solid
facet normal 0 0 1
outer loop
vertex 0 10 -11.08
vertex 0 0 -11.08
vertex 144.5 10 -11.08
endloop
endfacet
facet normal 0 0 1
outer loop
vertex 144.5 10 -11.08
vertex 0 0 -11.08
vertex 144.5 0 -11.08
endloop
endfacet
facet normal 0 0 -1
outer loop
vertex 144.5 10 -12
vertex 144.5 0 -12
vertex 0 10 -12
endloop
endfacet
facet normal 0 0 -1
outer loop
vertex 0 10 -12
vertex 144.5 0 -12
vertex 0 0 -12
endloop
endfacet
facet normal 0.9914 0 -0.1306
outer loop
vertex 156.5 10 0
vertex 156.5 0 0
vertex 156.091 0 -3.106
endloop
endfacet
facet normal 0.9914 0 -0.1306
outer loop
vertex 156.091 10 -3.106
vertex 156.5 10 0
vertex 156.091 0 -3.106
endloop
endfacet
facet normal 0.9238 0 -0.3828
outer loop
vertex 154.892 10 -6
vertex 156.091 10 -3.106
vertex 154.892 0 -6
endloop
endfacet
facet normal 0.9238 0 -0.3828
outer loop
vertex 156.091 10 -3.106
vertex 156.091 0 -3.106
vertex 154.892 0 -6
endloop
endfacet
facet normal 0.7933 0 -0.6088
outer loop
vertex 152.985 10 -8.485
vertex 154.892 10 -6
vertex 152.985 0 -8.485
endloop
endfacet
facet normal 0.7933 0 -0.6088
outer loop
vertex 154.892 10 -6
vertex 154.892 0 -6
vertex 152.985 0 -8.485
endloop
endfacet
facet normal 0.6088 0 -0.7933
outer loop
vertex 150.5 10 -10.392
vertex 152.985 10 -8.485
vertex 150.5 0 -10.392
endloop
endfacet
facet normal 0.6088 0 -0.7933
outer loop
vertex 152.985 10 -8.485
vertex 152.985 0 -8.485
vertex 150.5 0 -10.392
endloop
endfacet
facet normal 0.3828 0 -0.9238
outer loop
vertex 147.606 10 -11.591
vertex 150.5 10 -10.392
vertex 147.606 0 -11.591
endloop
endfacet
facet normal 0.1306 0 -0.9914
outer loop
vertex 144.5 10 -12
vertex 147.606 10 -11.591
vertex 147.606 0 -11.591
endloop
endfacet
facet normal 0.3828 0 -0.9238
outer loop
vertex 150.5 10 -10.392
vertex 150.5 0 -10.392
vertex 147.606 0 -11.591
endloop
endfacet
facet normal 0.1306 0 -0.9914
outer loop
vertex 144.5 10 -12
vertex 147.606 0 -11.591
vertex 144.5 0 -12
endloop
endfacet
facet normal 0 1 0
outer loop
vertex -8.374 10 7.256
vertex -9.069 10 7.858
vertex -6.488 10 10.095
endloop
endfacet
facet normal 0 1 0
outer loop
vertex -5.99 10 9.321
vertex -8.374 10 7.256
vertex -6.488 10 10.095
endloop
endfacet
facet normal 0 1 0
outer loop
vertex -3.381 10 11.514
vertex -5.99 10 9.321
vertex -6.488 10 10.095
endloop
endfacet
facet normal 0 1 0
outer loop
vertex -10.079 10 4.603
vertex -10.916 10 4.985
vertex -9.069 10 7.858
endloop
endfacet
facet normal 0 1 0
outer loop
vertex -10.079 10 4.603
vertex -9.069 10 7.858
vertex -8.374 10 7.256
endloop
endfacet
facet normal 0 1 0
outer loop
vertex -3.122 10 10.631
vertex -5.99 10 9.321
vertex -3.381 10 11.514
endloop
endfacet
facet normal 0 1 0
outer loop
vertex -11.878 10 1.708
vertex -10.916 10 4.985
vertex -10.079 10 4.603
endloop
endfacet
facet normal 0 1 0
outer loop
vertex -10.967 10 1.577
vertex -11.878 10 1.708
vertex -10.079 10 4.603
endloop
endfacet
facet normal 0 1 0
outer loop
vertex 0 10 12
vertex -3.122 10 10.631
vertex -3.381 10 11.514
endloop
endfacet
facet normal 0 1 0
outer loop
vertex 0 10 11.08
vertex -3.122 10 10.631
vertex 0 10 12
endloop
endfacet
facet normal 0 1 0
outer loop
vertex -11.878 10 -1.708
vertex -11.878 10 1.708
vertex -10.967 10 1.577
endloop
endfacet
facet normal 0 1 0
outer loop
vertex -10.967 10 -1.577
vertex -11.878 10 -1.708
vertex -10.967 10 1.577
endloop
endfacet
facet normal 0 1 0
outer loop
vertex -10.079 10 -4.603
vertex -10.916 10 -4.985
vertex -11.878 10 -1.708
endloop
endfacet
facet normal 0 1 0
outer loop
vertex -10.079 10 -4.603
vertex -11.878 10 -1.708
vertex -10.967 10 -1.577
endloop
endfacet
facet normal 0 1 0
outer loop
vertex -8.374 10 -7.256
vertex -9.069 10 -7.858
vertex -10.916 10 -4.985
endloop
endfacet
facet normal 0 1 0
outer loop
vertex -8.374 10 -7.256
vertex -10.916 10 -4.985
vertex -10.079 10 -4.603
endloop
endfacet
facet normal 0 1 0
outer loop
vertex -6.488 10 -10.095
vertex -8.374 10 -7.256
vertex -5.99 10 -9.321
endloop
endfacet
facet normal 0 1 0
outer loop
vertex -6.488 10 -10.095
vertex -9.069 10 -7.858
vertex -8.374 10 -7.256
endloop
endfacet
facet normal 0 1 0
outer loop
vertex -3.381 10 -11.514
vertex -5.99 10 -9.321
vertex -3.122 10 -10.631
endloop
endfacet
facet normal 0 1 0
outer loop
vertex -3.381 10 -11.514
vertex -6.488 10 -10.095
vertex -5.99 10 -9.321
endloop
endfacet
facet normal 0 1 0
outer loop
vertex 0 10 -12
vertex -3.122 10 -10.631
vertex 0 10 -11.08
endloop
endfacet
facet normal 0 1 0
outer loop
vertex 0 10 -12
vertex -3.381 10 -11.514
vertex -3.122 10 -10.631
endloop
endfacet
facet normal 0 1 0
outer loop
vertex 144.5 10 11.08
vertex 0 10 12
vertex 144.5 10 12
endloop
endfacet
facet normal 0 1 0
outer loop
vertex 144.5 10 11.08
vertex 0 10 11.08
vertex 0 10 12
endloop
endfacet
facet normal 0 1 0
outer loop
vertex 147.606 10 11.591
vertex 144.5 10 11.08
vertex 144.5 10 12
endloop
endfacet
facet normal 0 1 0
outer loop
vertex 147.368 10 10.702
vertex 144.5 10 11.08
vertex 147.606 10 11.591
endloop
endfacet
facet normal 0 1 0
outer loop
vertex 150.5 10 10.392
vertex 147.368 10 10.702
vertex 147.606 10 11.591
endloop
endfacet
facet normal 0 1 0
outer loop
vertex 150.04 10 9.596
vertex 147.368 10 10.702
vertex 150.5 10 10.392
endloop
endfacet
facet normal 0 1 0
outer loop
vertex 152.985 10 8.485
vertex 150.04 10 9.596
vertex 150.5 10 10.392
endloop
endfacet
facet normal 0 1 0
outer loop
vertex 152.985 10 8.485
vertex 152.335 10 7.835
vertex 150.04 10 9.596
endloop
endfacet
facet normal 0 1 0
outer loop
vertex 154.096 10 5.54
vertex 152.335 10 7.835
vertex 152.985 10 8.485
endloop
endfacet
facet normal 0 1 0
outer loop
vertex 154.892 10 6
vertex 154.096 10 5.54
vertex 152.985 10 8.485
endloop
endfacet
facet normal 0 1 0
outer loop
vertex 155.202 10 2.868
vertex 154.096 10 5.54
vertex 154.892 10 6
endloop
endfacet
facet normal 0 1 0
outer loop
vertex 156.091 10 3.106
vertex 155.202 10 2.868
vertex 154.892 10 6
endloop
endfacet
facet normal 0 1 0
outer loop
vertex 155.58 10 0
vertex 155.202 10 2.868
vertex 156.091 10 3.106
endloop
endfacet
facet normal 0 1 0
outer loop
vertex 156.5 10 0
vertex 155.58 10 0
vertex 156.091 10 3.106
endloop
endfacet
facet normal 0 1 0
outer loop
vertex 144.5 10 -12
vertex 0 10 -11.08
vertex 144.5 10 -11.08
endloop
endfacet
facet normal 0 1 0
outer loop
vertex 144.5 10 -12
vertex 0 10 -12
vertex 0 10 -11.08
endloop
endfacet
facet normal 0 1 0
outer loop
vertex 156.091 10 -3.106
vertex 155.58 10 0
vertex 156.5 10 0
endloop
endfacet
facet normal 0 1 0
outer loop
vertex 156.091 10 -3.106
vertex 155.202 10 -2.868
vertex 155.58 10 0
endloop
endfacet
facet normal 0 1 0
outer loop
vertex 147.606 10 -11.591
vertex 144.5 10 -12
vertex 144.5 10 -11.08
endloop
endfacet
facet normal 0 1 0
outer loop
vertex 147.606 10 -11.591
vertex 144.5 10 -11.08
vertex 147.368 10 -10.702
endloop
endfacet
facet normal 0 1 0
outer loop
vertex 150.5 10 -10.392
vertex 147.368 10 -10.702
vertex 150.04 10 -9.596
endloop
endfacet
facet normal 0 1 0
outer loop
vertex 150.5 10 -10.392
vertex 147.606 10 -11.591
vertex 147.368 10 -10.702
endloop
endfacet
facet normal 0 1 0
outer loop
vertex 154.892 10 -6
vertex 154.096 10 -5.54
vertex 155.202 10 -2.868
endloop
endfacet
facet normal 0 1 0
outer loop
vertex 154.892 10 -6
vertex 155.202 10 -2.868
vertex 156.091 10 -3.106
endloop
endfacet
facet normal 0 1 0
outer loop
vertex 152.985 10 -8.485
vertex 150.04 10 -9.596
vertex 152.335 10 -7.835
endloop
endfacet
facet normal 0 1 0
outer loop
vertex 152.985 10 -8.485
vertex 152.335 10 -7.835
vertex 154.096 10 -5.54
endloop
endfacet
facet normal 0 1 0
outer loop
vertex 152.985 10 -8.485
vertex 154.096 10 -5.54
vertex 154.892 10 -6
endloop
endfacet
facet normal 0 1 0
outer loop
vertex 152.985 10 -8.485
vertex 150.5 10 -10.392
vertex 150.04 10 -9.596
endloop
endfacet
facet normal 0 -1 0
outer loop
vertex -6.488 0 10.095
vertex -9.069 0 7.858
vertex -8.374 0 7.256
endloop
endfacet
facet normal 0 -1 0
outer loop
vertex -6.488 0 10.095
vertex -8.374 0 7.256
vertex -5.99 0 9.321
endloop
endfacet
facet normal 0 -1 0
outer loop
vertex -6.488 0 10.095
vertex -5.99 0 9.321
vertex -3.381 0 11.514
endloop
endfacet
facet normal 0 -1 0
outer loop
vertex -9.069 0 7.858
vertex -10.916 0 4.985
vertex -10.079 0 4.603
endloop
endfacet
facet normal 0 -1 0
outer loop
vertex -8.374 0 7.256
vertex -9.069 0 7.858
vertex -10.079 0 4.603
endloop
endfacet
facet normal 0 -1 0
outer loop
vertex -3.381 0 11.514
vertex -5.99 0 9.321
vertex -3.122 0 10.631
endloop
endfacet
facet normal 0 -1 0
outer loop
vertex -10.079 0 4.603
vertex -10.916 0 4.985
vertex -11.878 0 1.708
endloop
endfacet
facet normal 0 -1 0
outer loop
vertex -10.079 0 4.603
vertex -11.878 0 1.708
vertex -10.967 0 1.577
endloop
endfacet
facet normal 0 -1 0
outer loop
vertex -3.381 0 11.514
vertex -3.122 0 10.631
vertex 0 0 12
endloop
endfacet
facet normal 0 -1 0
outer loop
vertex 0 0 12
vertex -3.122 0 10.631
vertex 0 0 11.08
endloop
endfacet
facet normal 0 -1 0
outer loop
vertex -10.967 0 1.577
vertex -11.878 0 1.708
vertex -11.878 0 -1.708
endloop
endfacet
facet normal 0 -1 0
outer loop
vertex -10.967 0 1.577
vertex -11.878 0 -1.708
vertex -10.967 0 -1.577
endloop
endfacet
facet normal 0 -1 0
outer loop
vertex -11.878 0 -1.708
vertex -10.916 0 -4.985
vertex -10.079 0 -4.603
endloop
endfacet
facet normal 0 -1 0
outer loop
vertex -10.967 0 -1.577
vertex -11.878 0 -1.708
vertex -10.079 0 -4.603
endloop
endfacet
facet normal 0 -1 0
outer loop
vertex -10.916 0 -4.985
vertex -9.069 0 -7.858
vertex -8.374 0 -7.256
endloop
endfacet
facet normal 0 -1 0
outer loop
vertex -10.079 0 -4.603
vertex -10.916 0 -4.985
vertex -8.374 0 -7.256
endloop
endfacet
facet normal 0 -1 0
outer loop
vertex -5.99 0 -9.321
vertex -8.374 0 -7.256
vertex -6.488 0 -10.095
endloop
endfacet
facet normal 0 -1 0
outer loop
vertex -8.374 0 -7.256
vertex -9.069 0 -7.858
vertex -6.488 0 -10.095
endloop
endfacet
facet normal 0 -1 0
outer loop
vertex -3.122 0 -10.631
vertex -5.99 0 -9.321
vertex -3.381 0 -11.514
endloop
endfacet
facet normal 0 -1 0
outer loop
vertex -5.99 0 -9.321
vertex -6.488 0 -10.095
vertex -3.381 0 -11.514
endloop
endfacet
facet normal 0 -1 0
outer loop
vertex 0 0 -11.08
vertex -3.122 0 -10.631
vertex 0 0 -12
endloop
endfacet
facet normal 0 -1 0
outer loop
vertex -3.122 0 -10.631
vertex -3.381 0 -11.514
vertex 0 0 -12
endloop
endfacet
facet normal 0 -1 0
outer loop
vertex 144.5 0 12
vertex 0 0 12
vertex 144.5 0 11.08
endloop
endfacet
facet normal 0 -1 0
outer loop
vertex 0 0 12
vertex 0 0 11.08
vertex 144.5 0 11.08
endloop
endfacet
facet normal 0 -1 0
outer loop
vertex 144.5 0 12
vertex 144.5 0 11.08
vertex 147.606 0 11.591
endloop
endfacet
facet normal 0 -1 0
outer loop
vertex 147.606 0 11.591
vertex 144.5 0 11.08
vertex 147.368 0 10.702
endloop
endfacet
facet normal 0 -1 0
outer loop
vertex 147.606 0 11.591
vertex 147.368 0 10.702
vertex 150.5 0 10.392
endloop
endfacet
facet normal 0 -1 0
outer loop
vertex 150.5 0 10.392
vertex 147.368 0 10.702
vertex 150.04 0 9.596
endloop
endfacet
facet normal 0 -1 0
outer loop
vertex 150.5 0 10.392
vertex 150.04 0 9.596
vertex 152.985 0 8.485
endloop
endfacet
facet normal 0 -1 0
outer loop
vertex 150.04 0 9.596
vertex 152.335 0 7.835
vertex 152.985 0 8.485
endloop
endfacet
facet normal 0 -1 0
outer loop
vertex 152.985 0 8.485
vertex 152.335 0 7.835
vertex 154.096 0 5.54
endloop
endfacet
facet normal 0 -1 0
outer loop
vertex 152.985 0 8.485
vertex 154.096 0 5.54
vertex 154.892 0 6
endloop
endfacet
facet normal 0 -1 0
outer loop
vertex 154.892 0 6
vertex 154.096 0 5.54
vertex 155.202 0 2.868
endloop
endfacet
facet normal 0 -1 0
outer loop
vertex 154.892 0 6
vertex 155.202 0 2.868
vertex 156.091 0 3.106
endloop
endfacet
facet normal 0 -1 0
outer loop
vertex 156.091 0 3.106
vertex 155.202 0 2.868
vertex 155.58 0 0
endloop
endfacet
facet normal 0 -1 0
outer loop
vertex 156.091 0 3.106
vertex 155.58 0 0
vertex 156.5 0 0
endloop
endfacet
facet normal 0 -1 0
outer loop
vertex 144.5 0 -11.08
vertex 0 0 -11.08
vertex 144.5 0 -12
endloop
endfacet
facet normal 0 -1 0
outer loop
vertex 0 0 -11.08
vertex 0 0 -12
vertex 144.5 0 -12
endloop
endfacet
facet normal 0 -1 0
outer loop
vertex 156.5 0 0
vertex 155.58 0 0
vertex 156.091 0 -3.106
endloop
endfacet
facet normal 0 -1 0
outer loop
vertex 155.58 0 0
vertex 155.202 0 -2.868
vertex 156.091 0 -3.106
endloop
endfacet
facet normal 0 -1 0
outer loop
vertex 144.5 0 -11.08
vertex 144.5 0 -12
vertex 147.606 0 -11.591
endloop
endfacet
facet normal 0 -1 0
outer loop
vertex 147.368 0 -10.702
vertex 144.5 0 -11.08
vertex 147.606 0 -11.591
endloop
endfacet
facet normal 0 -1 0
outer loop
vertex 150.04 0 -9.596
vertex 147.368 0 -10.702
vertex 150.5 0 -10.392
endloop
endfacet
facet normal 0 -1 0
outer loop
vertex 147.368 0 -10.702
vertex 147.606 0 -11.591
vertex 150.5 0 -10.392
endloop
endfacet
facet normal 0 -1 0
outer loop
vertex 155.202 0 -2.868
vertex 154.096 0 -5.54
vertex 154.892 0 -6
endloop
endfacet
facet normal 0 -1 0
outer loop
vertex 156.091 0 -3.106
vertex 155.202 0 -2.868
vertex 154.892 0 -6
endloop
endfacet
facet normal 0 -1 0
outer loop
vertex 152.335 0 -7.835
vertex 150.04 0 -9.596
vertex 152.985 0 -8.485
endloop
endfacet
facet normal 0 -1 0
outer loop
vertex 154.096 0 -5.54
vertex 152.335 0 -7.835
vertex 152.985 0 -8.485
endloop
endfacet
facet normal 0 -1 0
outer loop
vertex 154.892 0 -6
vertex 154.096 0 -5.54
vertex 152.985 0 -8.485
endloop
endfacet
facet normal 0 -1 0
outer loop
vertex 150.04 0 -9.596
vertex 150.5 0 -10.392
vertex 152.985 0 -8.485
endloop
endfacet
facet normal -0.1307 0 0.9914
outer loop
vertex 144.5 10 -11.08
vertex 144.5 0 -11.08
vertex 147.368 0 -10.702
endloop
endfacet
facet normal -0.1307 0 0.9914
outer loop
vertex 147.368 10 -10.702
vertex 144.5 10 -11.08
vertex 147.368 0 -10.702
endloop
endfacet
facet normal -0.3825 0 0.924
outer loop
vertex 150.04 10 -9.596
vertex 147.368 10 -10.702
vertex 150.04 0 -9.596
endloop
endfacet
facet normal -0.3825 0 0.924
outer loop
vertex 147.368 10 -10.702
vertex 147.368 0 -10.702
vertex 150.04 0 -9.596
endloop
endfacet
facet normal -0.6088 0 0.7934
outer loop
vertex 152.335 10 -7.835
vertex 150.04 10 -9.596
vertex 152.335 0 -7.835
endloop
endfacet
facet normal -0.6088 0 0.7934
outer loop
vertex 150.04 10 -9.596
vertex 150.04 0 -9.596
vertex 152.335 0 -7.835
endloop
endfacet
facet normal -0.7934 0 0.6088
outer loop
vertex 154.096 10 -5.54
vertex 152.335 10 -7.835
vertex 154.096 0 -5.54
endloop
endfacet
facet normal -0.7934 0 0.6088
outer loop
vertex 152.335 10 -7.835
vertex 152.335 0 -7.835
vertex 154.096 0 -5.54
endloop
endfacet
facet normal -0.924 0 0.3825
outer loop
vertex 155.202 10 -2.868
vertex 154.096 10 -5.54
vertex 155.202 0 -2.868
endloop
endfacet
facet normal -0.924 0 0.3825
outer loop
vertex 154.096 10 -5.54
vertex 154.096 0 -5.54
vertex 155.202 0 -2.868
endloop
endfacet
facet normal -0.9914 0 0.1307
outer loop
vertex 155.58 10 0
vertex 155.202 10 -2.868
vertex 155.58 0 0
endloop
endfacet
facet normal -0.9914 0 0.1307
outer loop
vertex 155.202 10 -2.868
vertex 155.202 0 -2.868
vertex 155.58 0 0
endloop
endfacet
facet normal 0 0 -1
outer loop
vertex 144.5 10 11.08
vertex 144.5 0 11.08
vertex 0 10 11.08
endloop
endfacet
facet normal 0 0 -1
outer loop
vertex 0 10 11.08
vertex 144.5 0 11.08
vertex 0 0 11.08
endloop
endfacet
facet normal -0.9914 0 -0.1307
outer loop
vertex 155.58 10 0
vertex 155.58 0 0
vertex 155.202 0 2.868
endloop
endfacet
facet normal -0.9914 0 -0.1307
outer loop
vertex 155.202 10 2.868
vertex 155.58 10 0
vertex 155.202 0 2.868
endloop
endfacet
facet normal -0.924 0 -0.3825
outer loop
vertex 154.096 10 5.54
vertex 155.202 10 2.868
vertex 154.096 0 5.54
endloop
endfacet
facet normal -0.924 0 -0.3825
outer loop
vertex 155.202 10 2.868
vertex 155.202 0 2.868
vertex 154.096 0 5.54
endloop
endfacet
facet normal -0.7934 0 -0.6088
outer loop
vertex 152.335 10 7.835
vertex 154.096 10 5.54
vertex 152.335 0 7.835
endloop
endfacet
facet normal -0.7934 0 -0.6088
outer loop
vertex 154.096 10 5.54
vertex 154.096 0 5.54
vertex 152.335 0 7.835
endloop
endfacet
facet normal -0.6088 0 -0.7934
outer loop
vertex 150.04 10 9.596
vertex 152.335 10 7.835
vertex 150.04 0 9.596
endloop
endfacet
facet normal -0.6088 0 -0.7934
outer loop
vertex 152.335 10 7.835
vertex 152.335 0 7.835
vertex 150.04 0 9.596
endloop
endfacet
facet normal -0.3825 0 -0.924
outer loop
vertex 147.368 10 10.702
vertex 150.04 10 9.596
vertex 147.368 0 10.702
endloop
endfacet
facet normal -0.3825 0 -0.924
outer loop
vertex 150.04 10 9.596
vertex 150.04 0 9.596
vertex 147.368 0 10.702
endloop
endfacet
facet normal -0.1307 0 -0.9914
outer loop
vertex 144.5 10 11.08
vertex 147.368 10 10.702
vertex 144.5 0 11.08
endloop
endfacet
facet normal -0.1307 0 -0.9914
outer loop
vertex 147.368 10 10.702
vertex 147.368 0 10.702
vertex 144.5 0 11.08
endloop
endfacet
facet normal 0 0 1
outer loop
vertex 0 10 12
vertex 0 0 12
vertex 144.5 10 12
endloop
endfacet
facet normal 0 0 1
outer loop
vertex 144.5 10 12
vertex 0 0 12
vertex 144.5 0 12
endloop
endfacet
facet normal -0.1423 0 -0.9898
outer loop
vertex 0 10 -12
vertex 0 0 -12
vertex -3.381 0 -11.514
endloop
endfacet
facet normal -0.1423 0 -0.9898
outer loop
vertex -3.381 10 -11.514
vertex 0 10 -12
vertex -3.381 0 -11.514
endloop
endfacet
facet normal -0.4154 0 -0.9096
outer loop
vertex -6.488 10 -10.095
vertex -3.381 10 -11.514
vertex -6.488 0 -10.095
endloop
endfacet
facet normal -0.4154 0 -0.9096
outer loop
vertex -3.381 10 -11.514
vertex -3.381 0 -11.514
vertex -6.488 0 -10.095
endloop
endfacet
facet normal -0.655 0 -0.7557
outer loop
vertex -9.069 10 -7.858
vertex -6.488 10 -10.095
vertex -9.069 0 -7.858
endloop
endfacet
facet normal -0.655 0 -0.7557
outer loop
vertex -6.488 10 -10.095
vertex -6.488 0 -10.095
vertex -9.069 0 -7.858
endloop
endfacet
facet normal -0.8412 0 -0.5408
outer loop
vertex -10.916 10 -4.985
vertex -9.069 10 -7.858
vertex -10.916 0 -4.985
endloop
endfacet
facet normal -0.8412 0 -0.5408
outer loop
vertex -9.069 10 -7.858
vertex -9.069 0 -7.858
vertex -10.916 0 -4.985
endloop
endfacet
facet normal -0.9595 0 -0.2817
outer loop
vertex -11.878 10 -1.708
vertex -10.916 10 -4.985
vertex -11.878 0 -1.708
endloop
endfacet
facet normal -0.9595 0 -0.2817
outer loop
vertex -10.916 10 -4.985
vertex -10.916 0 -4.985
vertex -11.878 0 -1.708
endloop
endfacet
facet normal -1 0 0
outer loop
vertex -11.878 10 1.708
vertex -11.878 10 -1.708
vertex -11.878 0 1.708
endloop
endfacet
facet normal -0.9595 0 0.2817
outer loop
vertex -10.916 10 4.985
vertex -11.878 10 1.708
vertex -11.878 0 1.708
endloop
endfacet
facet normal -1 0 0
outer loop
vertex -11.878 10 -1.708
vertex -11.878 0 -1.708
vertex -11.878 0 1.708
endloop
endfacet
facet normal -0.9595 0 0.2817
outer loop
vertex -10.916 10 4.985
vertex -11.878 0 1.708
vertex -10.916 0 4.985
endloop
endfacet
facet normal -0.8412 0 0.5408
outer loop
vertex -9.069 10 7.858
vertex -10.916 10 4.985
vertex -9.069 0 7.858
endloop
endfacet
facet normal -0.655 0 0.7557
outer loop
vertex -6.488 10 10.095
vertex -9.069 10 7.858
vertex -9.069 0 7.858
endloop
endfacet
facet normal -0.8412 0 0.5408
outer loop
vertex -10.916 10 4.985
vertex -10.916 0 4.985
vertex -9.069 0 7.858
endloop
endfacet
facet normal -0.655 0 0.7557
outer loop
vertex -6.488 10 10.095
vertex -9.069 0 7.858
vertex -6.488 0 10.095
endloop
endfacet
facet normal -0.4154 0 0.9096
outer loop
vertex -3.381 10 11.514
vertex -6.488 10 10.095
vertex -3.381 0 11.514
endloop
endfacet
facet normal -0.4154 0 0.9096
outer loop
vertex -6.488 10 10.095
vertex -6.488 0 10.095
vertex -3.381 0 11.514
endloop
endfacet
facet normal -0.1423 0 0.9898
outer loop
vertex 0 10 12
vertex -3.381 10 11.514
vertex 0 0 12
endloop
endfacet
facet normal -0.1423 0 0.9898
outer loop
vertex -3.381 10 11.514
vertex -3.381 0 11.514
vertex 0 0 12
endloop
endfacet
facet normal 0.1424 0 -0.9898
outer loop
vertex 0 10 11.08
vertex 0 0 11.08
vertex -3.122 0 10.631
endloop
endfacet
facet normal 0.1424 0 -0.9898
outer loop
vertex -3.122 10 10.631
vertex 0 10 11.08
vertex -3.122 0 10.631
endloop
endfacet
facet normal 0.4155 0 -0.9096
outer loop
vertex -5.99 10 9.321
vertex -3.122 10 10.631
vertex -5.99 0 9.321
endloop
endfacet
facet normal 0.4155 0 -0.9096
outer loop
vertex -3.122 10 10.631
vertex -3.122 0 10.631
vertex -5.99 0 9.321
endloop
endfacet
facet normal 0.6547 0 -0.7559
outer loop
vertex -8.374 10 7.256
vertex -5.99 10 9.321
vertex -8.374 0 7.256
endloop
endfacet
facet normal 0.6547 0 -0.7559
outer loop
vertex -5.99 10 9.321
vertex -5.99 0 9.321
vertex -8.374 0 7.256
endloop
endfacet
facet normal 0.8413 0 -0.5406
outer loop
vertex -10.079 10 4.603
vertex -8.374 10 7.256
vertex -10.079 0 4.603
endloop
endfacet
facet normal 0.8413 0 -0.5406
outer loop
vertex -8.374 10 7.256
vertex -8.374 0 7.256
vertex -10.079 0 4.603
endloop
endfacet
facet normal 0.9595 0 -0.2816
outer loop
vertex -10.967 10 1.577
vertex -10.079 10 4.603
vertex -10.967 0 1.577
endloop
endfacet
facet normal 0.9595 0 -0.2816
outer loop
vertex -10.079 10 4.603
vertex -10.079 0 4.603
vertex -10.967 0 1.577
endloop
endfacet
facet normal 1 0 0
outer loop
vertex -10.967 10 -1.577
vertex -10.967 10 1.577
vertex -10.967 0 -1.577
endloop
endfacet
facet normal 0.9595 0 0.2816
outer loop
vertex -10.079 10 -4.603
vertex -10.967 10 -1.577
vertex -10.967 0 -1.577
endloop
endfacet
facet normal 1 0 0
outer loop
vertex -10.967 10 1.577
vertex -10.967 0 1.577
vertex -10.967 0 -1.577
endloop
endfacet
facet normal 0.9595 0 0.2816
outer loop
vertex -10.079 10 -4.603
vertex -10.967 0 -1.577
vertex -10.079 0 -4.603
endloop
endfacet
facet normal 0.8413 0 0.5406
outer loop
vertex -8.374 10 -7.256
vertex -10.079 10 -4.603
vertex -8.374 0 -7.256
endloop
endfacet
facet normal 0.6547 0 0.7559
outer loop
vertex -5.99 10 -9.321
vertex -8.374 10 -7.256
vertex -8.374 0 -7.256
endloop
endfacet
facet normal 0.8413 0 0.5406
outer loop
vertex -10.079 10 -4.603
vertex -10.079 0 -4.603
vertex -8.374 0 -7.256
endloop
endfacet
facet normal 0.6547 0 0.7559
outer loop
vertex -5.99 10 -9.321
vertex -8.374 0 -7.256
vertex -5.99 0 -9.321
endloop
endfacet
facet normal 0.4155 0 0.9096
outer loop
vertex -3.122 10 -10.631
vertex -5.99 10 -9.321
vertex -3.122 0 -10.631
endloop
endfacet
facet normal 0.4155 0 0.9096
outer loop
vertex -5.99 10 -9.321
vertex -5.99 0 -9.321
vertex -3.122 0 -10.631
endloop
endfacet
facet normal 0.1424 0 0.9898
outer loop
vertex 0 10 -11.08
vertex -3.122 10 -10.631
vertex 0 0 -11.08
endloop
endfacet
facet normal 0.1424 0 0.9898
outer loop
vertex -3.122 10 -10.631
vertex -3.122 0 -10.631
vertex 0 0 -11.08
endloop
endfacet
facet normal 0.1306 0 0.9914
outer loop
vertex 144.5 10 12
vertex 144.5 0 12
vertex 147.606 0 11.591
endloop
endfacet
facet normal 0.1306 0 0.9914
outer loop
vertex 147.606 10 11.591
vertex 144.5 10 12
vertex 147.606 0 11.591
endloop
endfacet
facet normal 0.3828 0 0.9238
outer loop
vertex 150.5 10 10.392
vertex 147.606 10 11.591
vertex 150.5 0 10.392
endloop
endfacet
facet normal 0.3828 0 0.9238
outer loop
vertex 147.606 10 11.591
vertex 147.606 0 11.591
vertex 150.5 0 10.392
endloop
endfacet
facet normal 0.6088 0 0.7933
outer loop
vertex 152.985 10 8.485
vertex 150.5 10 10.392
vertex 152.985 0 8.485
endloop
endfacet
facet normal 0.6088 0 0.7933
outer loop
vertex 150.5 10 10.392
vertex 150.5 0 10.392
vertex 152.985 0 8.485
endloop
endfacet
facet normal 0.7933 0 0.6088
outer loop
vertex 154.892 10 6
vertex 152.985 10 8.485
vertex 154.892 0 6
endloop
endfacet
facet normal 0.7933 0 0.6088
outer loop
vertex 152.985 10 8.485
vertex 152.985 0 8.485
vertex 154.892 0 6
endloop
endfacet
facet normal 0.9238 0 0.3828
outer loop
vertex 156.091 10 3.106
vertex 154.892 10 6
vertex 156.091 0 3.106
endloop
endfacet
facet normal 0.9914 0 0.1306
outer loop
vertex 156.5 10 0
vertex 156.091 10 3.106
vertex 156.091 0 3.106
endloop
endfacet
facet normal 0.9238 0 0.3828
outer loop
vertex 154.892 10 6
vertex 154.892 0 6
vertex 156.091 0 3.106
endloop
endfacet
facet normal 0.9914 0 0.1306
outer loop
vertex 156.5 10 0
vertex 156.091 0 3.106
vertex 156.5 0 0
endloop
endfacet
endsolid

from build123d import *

# Parameters (mm, degrees)
EXTRUDE_1_DEPTH = 10


with BuildPart() as part:
    # 草图1 → 凸台-拉伸1 (new body)
    with BuildSketch(Plane(origin=(0, 0, 0), x_dir=(1, 0, 0), z_dir=(0, 1, 0))):
        with BuildLine():
            ThreePointArc((156.5, 0), (152.985281374, 8.485281374), (144.5, 12))
            Line((144.5, 12), (144.5, 11.08))
            ThreePointArc((144.5, 11.08), (152.334743136, 7.834743136), (155.58, 0))
            ThreePointArc((155.58, 0), (152.334743136, -7.834743136), (144.5, -11.08))
            Line((144.5, -11.08), (144.5, -12))
            ThreePointArc((144.5, -12), (152.985281374, -8.485281374), (156.5, 0))
        make_face()
        with BuildLine():
            ThreePointArc((144.5, 12), (142.150531975, 11.767752547), (139.892006944, 11.08))
            Line((139.892006944, 11.08), (144.5, 11.08))
            Line((144.5, 11.08), (144.5, 12))
        make_face()
        with BuildLine():
            ThreePointArc((0, 12), (2.349468025, 11.767752547), (4.607993056, 11.08))
            Line((4.607993056, 11.08), (139.892006944, 11.08))
            ThreePointArc((139.892006944, 11.08), (142.150531975, 11.767752547), (144.5, 12))
            Line((144.5, 12), (0, 12))
        make_face()
        with BuildLine():
            Line((144.5, -11.08), (139.892006944, -11.08))
            ThreePointArc((139.892006944, -11.08), (142.150531975, -11.767752547), (144.5, -12))
            Line((144.5, -12), (144.5, -11.08))
        make_face()
        with BuildLine():
            Line((139.892006944, -11.08), (4.607993056, -11.08))
            ThreePointArc((4.607993056, -11.08), (2.349468025, -11.767752547), (0, -12))
            Line((0, -12), (144.5, -12))
            ThreePointArc((144.5, -12), (142.150531975, -11.767752547), (139.892006944, -11.08))
        make_face()
        with BuildLine():
            Line((0, 12), (0, 11.08))
            Line((0, 11.08), (4.607993056, 11.08))
            ThreePointArc((4.607993056, 11.08), (2.349468025, 11.767752547), (0, 12))
        make_face()
        with BuildLine():
            Line((4.607993056, -11.08), (0, -11.08))
            Line((0, -11.08), (0, -12))
            ThreePointArc((0, -12), (2.349468025, -11.767752547), (4.607993056, -11.08))
        make_face()
        with BuildLine():
            ThreePointArc((0, -11.08), (-11.08, 0), (0, 11.08))
            Line((0, 11.08), (0, 12))
            ThreePointArc((0, 12), (-12, 0), (0, -12))
            Line((0, -12), (0, -11.08))
        make_face()
    extrude(amount=EXTRUDE_1_DEPTH)


solid = part.part
